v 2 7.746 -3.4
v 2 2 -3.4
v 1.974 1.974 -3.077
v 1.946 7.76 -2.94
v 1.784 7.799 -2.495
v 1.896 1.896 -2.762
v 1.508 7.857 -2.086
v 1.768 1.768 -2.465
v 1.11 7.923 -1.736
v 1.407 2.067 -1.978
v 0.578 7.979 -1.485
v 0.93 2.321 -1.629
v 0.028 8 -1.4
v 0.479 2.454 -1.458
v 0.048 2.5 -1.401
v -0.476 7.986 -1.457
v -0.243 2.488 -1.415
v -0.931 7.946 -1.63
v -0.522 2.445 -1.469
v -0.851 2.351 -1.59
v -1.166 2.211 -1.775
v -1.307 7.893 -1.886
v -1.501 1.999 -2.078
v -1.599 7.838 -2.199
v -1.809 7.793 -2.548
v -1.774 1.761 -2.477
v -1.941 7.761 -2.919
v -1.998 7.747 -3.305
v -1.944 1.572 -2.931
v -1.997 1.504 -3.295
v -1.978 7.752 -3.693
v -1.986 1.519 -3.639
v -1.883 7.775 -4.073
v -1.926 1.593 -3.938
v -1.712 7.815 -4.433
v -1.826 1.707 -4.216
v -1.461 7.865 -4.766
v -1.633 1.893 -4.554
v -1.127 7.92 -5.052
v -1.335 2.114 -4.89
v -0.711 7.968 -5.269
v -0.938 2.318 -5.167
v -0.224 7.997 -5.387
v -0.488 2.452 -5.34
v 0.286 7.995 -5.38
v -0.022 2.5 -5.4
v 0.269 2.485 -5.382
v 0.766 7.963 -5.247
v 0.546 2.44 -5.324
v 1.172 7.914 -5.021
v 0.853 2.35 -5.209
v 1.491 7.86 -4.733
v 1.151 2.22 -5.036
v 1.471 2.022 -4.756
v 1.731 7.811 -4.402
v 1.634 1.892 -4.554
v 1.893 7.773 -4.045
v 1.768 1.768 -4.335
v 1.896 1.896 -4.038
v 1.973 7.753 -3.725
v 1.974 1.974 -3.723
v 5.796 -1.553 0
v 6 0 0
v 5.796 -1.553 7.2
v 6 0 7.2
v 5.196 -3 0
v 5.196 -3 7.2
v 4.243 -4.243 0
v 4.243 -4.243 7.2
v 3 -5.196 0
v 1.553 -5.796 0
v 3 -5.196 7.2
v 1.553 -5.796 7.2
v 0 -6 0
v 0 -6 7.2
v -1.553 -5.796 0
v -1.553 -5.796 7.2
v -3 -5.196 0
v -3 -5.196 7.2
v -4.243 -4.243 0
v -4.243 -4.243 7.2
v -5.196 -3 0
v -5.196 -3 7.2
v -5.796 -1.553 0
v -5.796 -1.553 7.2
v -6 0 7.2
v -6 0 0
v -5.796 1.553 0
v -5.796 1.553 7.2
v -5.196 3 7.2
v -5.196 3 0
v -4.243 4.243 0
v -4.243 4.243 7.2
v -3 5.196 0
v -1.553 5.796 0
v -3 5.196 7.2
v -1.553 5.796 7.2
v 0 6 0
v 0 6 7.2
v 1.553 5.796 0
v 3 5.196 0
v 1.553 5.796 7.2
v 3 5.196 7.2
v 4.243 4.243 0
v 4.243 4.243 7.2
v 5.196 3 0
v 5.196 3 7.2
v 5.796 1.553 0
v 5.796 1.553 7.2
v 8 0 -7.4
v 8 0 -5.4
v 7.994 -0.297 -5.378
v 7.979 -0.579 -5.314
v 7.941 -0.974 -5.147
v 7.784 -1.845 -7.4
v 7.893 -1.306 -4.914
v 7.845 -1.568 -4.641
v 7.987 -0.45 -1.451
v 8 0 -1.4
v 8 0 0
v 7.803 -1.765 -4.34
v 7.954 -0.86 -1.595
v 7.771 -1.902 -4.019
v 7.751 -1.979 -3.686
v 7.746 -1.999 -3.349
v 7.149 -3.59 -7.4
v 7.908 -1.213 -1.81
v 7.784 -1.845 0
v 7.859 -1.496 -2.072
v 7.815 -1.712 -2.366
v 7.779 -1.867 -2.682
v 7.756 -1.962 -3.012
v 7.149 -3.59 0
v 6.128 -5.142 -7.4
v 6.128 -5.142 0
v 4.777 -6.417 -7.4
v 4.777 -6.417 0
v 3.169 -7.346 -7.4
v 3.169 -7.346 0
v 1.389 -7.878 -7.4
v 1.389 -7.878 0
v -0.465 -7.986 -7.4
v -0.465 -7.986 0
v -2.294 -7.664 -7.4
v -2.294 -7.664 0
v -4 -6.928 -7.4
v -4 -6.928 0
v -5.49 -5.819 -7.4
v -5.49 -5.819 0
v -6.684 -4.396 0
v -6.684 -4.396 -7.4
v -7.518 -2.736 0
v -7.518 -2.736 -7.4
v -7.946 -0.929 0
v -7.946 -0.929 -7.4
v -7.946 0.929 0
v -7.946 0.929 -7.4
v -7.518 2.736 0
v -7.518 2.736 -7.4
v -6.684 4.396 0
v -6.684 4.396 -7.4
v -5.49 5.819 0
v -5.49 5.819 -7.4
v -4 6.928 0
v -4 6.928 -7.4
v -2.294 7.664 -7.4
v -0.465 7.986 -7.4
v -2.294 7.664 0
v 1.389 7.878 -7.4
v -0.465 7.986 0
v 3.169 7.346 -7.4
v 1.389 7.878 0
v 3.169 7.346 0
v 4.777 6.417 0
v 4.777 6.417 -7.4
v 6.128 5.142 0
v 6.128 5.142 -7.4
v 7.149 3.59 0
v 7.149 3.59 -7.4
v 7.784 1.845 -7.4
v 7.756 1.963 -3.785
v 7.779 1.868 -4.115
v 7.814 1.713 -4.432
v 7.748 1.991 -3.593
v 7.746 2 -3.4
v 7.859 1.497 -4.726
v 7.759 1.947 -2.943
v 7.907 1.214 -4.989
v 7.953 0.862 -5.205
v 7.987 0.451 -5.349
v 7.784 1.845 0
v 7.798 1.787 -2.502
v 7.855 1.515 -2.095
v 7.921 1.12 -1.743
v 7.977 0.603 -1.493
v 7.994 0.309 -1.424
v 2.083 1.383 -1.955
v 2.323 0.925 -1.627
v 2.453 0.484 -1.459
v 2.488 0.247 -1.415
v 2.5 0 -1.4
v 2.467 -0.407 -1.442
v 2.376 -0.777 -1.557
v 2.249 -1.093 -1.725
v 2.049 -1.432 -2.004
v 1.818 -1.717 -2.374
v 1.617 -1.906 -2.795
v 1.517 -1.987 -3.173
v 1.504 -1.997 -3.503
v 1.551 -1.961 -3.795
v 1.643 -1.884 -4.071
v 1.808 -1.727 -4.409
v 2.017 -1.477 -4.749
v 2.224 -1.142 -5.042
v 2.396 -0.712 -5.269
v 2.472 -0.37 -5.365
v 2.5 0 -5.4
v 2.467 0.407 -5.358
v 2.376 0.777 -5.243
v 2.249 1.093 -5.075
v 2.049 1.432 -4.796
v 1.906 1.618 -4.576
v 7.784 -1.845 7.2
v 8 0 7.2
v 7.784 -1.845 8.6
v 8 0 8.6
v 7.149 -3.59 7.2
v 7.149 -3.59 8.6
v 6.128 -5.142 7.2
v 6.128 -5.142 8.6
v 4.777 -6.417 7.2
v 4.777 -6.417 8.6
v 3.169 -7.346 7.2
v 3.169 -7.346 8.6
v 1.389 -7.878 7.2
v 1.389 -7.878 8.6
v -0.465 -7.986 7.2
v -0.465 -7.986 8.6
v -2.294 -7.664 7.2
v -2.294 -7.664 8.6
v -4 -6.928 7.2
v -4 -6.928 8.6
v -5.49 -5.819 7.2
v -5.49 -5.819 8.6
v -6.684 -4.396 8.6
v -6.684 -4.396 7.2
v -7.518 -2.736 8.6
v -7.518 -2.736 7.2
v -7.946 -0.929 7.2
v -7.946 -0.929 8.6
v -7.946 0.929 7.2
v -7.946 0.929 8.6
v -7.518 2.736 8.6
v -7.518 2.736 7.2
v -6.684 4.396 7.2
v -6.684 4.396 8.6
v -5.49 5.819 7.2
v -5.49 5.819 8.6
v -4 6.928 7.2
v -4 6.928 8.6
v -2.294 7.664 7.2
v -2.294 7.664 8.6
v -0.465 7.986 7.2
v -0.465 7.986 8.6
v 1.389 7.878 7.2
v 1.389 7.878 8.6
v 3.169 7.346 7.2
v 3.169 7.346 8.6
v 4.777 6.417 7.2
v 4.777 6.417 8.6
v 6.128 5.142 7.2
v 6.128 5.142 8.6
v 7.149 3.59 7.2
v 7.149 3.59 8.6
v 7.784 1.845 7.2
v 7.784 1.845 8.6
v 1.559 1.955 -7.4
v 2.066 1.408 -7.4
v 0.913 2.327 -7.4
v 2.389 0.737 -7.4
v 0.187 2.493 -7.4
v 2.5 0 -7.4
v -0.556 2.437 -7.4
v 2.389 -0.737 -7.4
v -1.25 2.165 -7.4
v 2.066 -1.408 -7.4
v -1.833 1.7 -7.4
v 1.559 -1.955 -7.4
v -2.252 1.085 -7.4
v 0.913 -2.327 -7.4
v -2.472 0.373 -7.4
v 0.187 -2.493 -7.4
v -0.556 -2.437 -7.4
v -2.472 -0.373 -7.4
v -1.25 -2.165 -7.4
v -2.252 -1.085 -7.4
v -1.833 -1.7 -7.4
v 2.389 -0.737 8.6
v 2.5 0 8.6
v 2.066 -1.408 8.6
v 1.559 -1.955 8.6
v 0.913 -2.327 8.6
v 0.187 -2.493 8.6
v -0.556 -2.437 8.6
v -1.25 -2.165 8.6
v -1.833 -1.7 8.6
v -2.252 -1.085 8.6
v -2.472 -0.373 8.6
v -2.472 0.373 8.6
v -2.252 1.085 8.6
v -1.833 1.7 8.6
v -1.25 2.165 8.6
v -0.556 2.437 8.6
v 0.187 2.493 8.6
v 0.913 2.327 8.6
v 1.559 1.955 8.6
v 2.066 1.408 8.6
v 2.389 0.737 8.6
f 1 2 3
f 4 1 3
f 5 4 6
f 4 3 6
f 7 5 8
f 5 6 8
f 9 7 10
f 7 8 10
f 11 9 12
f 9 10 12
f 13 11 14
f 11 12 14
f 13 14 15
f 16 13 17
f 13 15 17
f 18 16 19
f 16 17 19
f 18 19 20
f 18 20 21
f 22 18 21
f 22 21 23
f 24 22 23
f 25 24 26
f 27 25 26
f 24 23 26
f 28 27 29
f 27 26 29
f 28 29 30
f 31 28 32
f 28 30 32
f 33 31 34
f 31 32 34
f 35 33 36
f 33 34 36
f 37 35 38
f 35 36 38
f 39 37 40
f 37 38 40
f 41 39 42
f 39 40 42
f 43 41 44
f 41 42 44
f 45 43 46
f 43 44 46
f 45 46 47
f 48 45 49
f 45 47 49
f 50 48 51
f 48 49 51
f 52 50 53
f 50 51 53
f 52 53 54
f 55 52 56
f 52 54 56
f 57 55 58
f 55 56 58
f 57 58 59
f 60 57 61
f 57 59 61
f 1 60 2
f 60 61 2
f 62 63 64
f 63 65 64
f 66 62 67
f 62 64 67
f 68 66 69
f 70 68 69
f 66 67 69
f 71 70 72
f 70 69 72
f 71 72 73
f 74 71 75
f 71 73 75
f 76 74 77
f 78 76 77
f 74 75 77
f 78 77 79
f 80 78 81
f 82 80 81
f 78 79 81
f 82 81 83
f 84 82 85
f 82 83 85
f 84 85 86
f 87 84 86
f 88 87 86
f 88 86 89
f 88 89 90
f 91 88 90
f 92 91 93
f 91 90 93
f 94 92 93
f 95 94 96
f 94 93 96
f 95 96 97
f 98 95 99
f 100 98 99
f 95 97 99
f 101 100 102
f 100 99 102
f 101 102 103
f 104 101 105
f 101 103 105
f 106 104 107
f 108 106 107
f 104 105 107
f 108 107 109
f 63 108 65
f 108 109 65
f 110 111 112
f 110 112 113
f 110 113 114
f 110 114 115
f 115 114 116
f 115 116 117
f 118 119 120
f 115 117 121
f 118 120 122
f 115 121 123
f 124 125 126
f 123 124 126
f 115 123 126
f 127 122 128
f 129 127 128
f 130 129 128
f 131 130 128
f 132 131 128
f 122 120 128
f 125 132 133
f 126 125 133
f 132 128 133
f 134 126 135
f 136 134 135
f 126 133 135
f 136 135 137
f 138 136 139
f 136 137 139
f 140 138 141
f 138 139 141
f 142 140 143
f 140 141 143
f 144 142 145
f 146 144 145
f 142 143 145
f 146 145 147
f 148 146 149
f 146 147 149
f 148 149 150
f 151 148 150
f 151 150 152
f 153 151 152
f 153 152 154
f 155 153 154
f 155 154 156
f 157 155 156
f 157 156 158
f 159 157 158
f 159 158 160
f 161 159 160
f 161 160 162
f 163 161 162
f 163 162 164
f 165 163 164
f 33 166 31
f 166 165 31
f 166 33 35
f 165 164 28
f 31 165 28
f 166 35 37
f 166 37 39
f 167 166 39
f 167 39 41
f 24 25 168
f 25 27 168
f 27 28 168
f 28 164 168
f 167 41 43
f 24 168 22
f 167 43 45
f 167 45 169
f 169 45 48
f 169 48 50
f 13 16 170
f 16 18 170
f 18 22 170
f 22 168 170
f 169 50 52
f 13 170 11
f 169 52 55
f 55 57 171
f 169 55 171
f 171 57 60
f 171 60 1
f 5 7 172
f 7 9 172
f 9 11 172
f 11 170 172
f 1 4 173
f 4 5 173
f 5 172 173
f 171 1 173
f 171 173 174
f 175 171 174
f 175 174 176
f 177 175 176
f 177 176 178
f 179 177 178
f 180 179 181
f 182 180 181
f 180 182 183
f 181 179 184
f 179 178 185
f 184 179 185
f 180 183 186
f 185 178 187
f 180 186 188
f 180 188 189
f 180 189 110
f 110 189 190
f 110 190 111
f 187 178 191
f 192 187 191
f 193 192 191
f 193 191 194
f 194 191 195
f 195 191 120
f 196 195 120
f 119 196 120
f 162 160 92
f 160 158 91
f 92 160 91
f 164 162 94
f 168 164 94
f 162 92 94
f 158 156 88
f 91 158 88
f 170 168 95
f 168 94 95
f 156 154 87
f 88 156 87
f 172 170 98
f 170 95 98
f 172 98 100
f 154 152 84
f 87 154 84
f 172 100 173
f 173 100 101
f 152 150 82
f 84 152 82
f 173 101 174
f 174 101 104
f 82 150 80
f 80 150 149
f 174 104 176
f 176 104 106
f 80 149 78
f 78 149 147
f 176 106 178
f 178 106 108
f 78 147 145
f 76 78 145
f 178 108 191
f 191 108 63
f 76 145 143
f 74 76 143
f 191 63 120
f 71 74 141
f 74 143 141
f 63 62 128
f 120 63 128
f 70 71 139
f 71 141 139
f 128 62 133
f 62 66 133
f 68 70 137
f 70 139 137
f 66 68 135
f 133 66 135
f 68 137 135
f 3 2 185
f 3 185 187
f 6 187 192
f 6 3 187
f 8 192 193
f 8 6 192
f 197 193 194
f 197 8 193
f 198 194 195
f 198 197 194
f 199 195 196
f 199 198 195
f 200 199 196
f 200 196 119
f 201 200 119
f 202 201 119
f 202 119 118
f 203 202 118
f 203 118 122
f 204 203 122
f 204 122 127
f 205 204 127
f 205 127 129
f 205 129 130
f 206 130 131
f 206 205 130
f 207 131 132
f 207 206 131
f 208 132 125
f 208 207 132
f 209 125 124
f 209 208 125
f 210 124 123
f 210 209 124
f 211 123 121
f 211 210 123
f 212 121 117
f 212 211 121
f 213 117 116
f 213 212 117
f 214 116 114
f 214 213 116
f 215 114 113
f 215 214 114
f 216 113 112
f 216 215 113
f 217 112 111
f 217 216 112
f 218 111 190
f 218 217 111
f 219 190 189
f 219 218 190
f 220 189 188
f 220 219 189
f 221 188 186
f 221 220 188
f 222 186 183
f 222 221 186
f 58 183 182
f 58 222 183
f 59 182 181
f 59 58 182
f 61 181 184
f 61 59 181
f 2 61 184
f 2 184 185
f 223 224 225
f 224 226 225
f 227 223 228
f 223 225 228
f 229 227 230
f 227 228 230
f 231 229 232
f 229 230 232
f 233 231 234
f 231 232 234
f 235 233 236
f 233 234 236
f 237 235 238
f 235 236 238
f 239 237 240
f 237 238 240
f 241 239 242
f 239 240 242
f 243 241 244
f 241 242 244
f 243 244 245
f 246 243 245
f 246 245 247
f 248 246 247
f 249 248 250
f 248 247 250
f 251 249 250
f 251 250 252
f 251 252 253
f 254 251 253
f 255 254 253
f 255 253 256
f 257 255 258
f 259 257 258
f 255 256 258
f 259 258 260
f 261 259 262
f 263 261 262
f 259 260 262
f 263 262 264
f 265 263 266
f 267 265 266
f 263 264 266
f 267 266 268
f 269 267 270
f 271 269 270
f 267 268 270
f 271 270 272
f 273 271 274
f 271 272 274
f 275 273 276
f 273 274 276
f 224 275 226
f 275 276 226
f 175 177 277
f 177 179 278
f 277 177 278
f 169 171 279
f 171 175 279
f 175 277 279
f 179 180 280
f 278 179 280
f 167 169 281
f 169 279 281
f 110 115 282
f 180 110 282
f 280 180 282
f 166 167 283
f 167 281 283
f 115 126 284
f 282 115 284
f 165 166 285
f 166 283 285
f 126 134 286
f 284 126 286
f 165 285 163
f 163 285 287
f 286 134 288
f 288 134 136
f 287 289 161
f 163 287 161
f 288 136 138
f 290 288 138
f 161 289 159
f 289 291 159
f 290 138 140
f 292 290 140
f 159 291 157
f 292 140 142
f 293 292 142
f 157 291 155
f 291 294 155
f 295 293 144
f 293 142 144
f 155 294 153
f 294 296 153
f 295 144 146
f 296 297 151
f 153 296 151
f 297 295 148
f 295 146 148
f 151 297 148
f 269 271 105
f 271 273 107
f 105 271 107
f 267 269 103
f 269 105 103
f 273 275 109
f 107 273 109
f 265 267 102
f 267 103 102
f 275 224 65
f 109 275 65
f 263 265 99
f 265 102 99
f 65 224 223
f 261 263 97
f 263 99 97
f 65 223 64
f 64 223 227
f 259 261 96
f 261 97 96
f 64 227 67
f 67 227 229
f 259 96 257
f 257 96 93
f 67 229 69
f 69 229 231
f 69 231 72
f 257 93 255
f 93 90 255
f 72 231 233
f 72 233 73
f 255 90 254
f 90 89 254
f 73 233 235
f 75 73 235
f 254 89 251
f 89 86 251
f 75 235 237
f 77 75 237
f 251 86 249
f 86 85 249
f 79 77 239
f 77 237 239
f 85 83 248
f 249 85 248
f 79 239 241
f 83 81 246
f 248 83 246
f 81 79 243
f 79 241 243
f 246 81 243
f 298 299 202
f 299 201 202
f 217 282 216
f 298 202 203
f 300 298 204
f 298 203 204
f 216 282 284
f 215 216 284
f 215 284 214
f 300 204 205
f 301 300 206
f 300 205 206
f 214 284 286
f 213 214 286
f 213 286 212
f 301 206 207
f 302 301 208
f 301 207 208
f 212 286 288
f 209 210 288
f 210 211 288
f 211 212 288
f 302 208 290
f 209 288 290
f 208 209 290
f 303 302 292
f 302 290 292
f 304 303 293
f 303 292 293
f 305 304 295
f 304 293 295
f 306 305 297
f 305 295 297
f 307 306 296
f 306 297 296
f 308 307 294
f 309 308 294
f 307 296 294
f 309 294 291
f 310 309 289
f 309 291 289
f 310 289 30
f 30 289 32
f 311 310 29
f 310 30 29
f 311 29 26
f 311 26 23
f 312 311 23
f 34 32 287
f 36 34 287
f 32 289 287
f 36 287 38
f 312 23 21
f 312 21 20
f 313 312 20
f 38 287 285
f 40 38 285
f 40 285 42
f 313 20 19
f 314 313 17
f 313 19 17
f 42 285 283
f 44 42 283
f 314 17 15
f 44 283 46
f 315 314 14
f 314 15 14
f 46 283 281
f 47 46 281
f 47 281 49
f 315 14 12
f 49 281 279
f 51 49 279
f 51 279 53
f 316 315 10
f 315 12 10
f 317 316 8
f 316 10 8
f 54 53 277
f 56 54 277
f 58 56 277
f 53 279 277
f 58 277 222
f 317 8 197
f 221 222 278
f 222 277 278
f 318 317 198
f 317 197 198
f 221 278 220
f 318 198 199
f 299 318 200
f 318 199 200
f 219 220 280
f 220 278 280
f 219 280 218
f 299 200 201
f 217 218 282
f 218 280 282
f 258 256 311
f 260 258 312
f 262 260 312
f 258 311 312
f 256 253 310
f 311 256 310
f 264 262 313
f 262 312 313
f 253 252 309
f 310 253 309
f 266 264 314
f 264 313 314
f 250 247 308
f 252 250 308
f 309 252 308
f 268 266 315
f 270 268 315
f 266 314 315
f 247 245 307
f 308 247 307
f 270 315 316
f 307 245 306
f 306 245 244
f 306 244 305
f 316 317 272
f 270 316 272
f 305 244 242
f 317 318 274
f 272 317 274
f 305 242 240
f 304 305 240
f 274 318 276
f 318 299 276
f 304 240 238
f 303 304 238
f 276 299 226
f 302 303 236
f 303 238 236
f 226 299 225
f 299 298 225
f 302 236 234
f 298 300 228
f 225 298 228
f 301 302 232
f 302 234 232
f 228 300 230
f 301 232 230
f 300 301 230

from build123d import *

# Parameters (mm, degrees)
F2_R     = 2
F3_DEPTH = 25
F4_R     = 2
F5_DEPTH = 25


with BuildPart() as f1:
    # F0 (on Front) → F1 (revolve)
    with BuildSketch(Plane.XZ):
        Polygon((8, 8.6), (2.5, 8.6), (2.5, -7.4), (8, -7.4), (8, 0), (6, 0), (6, 7.2), (8, 7.2), align=None)
    revolve(axis=Axis((0, 0, 2.562595), (0, 0, -1)))

    # F2 (on Right) → F3 (cut)
    with BuildSketch(Plane.YZ):
        with Locations((0, -3.4)):
            Circle(F2_R)
    extrude(amount=F3_DEPTH, mode=Mode.SUBTRACT)

    # F4 (on Front) → F5 (cut)
    with BuildSketch(Plane.XZ):
        with Locations((0, -3.4)):
            Circle(F4_R)
    extrude(amount=-F5_DEPTH, mode=Mode.SUBTRACT)


solid = f1.part
